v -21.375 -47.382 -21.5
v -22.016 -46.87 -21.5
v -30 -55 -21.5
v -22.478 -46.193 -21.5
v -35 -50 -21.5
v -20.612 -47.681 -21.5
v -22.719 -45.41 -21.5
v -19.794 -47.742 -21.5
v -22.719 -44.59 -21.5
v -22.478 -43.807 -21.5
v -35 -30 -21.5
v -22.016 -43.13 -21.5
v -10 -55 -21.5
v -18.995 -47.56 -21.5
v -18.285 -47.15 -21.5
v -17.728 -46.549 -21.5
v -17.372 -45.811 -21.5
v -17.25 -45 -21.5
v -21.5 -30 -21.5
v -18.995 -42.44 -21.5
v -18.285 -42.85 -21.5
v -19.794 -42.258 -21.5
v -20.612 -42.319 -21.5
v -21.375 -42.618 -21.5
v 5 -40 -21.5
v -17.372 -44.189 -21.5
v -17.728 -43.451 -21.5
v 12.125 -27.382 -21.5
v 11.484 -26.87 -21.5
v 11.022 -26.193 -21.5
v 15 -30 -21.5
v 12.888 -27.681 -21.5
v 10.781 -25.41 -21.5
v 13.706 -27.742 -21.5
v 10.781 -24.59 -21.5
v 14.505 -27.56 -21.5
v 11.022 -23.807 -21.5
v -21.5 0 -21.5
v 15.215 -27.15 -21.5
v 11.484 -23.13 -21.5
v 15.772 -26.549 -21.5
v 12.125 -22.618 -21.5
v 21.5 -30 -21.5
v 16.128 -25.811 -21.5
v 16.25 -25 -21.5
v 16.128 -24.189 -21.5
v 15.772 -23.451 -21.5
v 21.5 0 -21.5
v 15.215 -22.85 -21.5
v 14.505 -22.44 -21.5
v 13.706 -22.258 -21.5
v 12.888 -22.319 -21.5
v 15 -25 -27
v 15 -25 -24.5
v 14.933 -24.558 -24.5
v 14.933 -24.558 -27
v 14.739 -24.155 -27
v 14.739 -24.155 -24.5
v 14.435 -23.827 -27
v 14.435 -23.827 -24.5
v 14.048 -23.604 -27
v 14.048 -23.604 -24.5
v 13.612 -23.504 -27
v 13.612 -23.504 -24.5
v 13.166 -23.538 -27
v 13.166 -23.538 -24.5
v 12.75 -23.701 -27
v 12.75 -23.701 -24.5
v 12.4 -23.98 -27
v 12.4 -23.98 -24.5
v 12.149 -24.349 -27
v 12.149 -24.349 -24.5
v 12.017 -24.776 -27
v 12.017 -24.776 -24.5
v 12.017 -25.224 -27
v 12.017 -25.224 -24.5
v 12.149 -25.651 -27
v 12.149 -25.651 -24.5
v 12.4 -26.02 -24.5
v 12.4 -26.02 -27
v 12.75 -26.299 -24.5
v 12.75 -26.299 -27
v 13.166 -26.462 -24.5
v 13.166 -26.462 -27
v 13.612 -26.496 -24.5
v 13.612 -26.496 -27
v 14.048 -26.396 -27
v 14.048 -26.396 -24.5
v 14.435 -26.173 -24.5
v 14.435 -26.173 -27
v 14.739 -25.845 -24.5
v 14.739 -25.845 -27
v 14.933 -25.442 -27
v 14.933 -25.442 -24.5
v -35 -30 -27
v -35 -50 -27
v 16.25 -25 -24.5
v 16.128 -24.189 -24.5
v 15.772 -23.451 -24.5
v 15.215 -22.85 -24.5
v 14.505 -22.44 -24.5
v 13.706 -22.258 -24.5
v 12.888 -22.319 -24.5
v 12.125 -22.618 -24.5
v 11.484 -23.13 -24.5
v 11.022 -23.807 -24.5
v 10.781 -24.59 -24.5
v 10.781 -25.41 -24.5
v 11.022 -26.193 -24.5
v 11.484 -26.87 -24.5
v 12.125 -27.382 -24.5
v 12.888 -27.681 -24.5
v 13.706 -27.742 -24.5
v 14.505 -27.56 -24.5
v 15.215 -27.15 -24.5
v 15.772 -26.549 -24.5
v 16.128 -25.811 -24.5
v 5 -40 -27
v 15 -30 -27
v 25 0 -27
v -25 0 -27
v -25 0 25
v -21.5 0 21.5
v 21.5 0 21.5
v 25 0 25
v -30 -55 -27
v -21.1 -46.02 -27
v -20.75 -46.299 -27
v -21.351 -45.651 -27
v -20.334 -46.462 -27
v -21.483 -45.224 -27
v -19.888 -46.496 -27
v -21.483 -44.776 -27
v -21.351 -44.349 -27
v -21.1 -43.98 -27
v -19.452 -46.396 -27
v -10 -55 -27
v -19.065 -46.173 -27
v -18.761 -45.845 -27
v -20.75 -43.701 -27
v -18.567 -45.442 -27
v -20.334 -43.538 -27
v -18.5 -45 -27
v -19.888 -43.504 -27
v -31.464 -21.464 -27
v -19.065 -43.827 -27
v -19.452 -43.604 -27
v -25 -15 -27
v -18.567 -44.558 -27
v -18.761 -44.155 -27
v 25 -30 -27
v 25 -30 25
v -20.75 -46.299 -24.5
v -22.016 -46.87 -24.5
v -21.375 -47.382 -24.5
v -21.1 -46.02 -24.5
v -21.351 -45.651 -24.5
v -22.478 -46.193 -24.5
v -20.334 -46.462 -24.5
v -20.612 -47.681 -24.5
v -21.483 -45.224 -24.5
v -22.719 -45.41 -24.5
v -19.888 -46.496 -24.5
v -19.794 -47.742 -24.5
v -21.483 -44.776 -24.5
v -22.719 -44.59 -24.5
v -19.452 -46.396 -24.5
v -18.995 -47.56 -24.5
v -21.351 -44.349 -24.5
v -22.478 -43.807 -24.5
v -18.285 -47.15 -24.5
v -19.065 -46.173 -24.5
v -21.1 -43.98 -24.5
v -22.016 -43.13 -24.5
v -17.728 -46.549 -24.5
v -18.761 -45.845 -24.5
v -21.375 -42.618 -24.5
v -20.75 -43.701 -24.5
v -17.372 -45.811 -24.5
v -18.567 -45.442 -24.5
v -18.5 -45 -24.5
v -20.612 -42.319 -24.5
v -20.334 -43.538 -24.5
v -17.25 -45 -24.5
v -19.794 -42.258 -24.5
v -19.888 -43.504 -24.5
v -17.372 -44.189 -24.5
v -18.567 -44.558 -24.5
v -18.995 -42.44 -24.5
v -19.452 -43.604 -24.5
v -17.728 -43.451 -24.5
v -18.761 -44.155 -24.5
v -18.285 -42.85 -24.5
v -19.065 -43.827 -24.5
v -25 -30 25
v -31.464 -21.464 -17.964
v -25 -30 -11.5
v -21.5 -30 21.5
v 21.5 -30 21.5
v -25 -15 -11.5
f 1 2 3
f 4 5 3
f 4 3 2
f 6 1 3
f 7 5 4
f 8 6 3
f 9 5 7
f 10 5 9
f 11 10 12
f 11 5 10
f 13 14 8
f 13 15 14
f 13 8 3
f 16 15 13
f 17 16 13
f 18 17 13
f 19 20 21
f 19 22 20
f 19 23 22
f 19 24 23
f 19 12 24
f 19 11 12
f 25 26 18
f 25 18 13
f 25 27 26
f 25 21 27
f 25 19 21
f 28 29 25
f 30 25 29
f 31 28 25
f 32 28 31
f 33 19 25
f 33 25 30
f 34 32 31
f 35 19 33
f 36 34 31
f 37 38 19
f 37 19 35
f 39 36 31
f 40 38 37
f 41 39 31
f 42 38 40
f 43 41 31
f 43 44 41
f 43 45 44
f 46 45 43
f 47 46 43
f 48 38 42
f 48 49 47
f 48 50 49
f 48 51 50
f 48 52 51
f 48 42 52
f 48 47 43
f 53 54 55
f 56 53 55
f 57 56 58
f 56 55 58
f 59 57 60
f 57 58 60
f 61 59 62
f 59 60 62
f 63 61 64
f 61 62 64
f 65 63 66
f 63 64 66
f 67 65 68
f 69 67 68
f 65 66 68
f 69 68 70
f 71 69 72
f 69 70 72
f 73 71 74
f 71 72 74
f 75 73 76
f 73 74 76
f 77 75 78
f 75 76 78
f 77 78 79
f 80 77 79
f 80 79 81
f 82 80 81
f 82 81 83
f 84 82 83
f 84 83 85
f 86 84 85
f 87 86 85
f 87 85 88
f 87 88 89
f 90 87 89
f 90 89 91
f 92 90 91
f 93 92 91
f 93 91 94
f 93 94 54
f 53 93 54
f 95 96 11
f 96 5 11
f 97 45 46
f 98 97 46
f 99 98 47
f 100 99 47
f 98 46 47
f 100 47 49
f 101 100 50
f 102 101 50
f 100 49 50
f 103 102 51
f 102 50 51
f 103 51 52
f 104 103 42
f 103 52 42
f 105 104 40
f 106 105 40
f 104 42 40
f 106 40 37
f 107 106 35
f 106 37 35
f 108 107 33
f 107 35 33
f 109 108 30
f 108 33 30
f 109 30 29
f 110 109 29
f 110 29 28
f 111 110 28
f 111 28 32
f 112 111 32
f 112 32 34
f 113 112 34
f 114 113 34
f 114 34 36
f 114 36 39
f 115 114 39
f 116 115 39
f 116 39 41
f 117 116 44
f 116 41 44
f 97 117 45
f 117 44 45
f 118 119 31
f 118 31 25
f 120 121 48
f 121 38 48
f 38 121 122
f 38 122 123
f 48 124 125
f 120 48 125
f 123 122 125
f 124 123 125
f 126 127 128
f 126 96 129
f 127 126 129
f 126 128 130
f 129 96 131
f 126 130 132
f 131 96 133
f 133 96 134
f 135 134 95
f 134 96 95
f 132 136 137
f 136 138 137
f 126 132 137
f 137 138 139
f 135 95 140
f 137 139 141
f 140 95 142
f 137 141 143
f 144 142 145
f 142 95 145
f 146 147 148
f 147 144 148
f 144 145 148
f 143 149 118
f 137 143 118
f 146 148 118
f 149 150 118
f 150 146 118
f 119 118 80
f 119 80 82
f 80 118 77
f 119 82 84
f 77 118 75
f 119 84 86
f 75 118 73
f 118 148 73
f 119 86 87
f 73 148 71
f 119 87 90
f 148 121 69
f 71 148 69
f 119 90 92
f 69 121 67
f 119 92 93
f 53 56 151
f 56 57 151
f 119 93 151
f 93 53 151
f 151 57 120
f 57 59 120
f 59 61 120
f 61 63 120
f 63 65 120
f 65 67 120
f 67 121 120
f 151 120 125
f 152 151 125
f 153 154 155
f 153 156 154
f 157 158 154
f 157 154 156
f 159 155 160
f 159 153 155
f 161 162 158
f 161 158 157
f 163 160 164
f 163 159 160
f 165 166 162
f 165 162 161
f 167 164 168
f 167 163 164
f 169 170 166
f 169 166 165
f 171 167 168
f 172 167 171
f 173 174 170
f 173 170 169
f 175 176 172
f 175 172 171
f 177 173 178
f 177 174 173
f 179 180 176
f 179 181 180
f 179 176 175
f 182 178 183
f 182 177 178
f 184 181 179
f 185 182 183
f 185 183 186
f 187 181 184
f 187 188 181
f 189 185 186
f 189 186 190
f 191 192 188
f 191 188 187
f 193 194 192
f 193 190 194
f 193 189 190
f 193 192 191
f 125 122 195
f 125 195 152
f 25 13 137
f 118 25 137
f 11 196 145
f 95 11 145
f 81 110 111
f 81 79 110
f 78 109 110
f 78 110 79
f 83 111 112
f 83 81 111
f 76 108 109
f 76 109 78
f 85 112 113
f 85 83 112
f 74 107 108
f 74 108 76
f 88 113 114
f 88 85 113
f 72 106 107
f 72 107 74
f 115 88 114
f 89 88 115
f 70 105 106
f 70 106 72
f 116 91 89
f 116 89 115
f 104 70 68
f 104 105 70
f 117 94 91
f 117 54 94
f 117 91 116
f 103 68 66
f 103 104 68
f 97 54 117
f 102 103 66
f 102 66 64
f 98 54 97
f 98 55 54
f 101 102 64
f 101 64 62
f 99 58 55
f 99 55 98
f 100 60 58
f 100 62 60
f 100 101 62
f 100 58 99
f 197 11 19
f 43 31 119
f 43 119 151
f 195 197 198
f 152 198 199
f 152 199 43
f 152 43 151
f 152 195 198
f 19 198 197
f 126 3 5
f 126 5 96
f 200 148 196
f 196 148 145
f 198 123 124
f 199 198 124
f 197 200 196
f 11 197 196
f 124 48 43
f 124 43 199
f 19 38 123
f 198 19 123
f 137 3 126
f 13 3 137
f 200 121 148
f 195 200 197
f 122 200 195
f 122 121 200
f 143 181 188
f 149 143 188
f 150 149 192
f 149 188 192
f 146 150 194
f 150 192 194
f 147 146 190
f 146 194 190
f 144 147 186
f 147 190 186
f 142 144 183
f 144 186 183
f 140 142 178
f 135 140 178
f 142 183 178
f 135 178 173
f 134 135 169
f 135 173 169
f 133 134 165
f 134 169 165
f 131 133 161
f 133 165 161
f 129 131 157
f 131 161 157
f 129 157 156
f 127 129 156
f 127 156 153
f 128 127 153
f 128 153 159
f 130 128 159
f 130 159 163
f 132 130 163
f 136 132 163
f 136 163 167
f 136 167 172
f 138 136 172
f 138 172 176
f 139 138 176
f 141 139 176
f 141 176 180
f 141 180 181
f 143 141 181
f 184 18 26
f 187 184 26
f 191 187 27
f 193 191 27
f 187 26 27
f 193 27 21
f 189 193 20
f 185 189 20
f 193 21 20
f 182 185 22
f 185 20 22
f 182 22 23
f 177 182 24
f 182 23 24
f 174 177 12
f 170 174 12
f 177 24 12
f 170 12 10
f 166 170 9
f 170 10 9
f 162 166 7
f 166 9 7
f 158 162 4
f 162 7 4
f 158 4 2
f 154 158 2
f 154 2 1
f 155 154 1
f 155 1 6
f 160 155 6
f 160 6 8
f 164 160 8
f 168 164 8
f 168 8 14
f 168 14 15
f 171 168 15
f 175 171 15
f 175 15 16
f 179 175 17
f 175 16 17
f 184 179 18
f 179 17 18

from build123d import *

# Parameters (mm, degrees)
F0_W          = 50
F0_H          = 52
F2_DEPTH      = 30
F1_W          = 43
F1_H          = 43
F3_DEPTH      = 30
F5_W          = 40
F5_H          = 30
F6_DEPTH      = 5.5
F4_W          = 10
F4_H          = 5.5
F7_DEPTH      = 20
F8_R          = 1.5
F9_DEPTH      = 25
F10_R         = 2.75
F11_DEPTH     = 3
F12_T1_DEPTH  = 5.5
F12_T6_DEPTH  = 5.5
F12_T11_DEPTH = 5
F12_T17_DEPTH = 31.2168298797
F12_T22_DEPTH = 30.7168298797
F13_SIZE      = 14.99999
F14_SIZE      = 5
F15_SIZE      = 5


# Not quite as in the source:
# - a fillet or chamfer that OpenCascade refuses, or shapes differently, is made with other operations: its cross-section is extruded or revolved along the edge and cut away or added
# - a fillet or chamfer is up to 0.001 mm smaller than in the source, because OpenCascade refuses the exact size


with BuildPart() as f2:
    # F0 (on Front) → F2 (new body)
    with BuildSketch(Plane.XZ):
        with Locations((0, -1)):
            Rectangle(F0_W, F0_H)
    extrude(amount=F2_DEPTH)

    # F1 (on face) → F3 (cut)
    with BuildSketch(Plane.XZ):
        Rectangle(F1_W, F1_H)
    extrude(amount=F3_DEPTH, mode=Mode.SUBTRACT)

    # F5 (on face) → F6 (join)
    with BuildSketch(Plane.XY.offset(-21.5)):
        with Locations((-15, -40)):
            Rectangle(F5_W, F5_H)
    extrude(amount=-F6_DEPTH)

    # F4 (on face) → F7 (join)
    with BuildSketch(Plane.XZ.offset(30)):
        with Locations((-20, -24.25)):
            Rectangle(F4_W, F4_H)
    extrude(amount=F7_DEPTH)

    # F8 (on face) → F9 (cut)
    with BuildSketch(Plane.XY.offset(-21.5)):
        with Locations((-20, -45)):
            Circle(F8_R)
        with Locations((13.5, -25)):
            Circle(F8_R)
    extrude(amount=-F9_DEPTH, mode=Mode.SUBTRACT)

    # F10 (on face) → F11 (cut)
    with BuildSketch(Plane.XY.offset(-21.5)):
        with Locations((-20, -45)):
            Circle(F10_R)
        with Locations((13.5, -25)):
            Circle(F10_R)
    extrude(amount=-F11_DEPTH, mode=Mode.SUBTRACT)

    # F12: chamfer of 10 on 3 edges, made by hand

    # F12_s2 → F12_t1 (join)
    with BuildSketch(Plane.XY.offset(-27)):
        Polygon((15, -30), (5, -40), (5, -30), align=None)
    extrude(amount=F12_T1_DEPTH)


with BuildPart() as f12_tool4:
    # F12_s5 → F12_t6 (new body)
    with BuildSketch(Plane.XY.offset(-27)):
        Polygon((-25, -15), (-35, -25), (-25, -25), align=None)
    extrude(amount=F12_T6_DEPTH)

    split(bisect_by=Plane.YZ.offset(-35), keep=Keep.TOP)


with BuildPart() as f2_1:
    add(f2.part)

    # F12_t3: union F12_tool4
    add(f12_tool4.part)


with BuildPart() as f12_tool9:
    # F12_s10 → F12_t11 (new body)
    with BuildSketch(Plane.XZ.offset(25)):
        Polygon((-25, -11.5), (-35, -21.5), (-25, -21.5), align=None)
    extrude(amount=F12_T11_DEPTH)

    split(bisect_by=Plane.YZ.offset(-35), keep=Keep.TOP)


with BuildPart() as f2_2:
    add(f2_1.part)

    # F12_t8: union F12_tool9
    add(f12_tool9.part)


with BuildPart() as f12_tool15:
    # F12_s16 → F12_t17 (new body)
    with BuildSketch(Plane.XY.offset(-27)):
        Polygon((-25, -15), (-35, -25), (-25, -25), align=None)
    extrude(amount=F12_T17_DEPTH)

    split(bisect_by=Plane.XY.offset(-21.5), keep=Keep.TOP)

    split(bisect_by=Plane.YZ.offset(-35), keep=Keep.TOP)


with BuildPart() as f12_tool20:
    # F12_s21 → F12_t22 (new body)
    with BuildSketch(Plane.XZ.offset(-0.7168298797)):
        Polygon((-25, -11.5), (-35, -21.5), (-25, -21.5), align=None)
    extrude(amount=F12_T22_DEPTH)

    split(bisect_by=Plane.XZ, keep=Keep.TOP)

    split(bisect_by=Plane.XZ.offset(25), keep=Keep.BOTTOM)

    split(bisect_by=Plane.YZ.offset(-35), keep=Keep.TOP)


with BuildPart() as f12_tool15_1:
    add(f12_tool15.part)

    # F12_t26: intersect F12_tool20
    add(f12_tool20.part, mode=Mode.INTERSECT)


with BuildPart() as f2_3:
    add(f2_2.part)

    # F12_t13: union F12_tool15
    add(f12_tool15_1.part)

    # F13 (size 15 in the source; OpenCascade refuses exactly that, so slightly less here)
    f13_edges = [f2_3.edges().sort_by_distance(p)[0] for p in [
        (5, -55, -24.25),
    ]]
    chamfer(f13_edges, length=F13_SIZE)

    # F14
    f14_edges = [f2_3.edges().sort_by_distance(p)[0] for p in [
        (-35, -55, -24.25),
    ]]
    chamfer(f14_edges, length=F14_SIZE)

    # F15
    f15_edges = [f2_3.edges().sort_by_distance(p)[0] for p in [
        (-35, -25, -24.25),
    ]]
    chamfer(f15_edges, length=F15_SIZE)


solid = f2_3.part
